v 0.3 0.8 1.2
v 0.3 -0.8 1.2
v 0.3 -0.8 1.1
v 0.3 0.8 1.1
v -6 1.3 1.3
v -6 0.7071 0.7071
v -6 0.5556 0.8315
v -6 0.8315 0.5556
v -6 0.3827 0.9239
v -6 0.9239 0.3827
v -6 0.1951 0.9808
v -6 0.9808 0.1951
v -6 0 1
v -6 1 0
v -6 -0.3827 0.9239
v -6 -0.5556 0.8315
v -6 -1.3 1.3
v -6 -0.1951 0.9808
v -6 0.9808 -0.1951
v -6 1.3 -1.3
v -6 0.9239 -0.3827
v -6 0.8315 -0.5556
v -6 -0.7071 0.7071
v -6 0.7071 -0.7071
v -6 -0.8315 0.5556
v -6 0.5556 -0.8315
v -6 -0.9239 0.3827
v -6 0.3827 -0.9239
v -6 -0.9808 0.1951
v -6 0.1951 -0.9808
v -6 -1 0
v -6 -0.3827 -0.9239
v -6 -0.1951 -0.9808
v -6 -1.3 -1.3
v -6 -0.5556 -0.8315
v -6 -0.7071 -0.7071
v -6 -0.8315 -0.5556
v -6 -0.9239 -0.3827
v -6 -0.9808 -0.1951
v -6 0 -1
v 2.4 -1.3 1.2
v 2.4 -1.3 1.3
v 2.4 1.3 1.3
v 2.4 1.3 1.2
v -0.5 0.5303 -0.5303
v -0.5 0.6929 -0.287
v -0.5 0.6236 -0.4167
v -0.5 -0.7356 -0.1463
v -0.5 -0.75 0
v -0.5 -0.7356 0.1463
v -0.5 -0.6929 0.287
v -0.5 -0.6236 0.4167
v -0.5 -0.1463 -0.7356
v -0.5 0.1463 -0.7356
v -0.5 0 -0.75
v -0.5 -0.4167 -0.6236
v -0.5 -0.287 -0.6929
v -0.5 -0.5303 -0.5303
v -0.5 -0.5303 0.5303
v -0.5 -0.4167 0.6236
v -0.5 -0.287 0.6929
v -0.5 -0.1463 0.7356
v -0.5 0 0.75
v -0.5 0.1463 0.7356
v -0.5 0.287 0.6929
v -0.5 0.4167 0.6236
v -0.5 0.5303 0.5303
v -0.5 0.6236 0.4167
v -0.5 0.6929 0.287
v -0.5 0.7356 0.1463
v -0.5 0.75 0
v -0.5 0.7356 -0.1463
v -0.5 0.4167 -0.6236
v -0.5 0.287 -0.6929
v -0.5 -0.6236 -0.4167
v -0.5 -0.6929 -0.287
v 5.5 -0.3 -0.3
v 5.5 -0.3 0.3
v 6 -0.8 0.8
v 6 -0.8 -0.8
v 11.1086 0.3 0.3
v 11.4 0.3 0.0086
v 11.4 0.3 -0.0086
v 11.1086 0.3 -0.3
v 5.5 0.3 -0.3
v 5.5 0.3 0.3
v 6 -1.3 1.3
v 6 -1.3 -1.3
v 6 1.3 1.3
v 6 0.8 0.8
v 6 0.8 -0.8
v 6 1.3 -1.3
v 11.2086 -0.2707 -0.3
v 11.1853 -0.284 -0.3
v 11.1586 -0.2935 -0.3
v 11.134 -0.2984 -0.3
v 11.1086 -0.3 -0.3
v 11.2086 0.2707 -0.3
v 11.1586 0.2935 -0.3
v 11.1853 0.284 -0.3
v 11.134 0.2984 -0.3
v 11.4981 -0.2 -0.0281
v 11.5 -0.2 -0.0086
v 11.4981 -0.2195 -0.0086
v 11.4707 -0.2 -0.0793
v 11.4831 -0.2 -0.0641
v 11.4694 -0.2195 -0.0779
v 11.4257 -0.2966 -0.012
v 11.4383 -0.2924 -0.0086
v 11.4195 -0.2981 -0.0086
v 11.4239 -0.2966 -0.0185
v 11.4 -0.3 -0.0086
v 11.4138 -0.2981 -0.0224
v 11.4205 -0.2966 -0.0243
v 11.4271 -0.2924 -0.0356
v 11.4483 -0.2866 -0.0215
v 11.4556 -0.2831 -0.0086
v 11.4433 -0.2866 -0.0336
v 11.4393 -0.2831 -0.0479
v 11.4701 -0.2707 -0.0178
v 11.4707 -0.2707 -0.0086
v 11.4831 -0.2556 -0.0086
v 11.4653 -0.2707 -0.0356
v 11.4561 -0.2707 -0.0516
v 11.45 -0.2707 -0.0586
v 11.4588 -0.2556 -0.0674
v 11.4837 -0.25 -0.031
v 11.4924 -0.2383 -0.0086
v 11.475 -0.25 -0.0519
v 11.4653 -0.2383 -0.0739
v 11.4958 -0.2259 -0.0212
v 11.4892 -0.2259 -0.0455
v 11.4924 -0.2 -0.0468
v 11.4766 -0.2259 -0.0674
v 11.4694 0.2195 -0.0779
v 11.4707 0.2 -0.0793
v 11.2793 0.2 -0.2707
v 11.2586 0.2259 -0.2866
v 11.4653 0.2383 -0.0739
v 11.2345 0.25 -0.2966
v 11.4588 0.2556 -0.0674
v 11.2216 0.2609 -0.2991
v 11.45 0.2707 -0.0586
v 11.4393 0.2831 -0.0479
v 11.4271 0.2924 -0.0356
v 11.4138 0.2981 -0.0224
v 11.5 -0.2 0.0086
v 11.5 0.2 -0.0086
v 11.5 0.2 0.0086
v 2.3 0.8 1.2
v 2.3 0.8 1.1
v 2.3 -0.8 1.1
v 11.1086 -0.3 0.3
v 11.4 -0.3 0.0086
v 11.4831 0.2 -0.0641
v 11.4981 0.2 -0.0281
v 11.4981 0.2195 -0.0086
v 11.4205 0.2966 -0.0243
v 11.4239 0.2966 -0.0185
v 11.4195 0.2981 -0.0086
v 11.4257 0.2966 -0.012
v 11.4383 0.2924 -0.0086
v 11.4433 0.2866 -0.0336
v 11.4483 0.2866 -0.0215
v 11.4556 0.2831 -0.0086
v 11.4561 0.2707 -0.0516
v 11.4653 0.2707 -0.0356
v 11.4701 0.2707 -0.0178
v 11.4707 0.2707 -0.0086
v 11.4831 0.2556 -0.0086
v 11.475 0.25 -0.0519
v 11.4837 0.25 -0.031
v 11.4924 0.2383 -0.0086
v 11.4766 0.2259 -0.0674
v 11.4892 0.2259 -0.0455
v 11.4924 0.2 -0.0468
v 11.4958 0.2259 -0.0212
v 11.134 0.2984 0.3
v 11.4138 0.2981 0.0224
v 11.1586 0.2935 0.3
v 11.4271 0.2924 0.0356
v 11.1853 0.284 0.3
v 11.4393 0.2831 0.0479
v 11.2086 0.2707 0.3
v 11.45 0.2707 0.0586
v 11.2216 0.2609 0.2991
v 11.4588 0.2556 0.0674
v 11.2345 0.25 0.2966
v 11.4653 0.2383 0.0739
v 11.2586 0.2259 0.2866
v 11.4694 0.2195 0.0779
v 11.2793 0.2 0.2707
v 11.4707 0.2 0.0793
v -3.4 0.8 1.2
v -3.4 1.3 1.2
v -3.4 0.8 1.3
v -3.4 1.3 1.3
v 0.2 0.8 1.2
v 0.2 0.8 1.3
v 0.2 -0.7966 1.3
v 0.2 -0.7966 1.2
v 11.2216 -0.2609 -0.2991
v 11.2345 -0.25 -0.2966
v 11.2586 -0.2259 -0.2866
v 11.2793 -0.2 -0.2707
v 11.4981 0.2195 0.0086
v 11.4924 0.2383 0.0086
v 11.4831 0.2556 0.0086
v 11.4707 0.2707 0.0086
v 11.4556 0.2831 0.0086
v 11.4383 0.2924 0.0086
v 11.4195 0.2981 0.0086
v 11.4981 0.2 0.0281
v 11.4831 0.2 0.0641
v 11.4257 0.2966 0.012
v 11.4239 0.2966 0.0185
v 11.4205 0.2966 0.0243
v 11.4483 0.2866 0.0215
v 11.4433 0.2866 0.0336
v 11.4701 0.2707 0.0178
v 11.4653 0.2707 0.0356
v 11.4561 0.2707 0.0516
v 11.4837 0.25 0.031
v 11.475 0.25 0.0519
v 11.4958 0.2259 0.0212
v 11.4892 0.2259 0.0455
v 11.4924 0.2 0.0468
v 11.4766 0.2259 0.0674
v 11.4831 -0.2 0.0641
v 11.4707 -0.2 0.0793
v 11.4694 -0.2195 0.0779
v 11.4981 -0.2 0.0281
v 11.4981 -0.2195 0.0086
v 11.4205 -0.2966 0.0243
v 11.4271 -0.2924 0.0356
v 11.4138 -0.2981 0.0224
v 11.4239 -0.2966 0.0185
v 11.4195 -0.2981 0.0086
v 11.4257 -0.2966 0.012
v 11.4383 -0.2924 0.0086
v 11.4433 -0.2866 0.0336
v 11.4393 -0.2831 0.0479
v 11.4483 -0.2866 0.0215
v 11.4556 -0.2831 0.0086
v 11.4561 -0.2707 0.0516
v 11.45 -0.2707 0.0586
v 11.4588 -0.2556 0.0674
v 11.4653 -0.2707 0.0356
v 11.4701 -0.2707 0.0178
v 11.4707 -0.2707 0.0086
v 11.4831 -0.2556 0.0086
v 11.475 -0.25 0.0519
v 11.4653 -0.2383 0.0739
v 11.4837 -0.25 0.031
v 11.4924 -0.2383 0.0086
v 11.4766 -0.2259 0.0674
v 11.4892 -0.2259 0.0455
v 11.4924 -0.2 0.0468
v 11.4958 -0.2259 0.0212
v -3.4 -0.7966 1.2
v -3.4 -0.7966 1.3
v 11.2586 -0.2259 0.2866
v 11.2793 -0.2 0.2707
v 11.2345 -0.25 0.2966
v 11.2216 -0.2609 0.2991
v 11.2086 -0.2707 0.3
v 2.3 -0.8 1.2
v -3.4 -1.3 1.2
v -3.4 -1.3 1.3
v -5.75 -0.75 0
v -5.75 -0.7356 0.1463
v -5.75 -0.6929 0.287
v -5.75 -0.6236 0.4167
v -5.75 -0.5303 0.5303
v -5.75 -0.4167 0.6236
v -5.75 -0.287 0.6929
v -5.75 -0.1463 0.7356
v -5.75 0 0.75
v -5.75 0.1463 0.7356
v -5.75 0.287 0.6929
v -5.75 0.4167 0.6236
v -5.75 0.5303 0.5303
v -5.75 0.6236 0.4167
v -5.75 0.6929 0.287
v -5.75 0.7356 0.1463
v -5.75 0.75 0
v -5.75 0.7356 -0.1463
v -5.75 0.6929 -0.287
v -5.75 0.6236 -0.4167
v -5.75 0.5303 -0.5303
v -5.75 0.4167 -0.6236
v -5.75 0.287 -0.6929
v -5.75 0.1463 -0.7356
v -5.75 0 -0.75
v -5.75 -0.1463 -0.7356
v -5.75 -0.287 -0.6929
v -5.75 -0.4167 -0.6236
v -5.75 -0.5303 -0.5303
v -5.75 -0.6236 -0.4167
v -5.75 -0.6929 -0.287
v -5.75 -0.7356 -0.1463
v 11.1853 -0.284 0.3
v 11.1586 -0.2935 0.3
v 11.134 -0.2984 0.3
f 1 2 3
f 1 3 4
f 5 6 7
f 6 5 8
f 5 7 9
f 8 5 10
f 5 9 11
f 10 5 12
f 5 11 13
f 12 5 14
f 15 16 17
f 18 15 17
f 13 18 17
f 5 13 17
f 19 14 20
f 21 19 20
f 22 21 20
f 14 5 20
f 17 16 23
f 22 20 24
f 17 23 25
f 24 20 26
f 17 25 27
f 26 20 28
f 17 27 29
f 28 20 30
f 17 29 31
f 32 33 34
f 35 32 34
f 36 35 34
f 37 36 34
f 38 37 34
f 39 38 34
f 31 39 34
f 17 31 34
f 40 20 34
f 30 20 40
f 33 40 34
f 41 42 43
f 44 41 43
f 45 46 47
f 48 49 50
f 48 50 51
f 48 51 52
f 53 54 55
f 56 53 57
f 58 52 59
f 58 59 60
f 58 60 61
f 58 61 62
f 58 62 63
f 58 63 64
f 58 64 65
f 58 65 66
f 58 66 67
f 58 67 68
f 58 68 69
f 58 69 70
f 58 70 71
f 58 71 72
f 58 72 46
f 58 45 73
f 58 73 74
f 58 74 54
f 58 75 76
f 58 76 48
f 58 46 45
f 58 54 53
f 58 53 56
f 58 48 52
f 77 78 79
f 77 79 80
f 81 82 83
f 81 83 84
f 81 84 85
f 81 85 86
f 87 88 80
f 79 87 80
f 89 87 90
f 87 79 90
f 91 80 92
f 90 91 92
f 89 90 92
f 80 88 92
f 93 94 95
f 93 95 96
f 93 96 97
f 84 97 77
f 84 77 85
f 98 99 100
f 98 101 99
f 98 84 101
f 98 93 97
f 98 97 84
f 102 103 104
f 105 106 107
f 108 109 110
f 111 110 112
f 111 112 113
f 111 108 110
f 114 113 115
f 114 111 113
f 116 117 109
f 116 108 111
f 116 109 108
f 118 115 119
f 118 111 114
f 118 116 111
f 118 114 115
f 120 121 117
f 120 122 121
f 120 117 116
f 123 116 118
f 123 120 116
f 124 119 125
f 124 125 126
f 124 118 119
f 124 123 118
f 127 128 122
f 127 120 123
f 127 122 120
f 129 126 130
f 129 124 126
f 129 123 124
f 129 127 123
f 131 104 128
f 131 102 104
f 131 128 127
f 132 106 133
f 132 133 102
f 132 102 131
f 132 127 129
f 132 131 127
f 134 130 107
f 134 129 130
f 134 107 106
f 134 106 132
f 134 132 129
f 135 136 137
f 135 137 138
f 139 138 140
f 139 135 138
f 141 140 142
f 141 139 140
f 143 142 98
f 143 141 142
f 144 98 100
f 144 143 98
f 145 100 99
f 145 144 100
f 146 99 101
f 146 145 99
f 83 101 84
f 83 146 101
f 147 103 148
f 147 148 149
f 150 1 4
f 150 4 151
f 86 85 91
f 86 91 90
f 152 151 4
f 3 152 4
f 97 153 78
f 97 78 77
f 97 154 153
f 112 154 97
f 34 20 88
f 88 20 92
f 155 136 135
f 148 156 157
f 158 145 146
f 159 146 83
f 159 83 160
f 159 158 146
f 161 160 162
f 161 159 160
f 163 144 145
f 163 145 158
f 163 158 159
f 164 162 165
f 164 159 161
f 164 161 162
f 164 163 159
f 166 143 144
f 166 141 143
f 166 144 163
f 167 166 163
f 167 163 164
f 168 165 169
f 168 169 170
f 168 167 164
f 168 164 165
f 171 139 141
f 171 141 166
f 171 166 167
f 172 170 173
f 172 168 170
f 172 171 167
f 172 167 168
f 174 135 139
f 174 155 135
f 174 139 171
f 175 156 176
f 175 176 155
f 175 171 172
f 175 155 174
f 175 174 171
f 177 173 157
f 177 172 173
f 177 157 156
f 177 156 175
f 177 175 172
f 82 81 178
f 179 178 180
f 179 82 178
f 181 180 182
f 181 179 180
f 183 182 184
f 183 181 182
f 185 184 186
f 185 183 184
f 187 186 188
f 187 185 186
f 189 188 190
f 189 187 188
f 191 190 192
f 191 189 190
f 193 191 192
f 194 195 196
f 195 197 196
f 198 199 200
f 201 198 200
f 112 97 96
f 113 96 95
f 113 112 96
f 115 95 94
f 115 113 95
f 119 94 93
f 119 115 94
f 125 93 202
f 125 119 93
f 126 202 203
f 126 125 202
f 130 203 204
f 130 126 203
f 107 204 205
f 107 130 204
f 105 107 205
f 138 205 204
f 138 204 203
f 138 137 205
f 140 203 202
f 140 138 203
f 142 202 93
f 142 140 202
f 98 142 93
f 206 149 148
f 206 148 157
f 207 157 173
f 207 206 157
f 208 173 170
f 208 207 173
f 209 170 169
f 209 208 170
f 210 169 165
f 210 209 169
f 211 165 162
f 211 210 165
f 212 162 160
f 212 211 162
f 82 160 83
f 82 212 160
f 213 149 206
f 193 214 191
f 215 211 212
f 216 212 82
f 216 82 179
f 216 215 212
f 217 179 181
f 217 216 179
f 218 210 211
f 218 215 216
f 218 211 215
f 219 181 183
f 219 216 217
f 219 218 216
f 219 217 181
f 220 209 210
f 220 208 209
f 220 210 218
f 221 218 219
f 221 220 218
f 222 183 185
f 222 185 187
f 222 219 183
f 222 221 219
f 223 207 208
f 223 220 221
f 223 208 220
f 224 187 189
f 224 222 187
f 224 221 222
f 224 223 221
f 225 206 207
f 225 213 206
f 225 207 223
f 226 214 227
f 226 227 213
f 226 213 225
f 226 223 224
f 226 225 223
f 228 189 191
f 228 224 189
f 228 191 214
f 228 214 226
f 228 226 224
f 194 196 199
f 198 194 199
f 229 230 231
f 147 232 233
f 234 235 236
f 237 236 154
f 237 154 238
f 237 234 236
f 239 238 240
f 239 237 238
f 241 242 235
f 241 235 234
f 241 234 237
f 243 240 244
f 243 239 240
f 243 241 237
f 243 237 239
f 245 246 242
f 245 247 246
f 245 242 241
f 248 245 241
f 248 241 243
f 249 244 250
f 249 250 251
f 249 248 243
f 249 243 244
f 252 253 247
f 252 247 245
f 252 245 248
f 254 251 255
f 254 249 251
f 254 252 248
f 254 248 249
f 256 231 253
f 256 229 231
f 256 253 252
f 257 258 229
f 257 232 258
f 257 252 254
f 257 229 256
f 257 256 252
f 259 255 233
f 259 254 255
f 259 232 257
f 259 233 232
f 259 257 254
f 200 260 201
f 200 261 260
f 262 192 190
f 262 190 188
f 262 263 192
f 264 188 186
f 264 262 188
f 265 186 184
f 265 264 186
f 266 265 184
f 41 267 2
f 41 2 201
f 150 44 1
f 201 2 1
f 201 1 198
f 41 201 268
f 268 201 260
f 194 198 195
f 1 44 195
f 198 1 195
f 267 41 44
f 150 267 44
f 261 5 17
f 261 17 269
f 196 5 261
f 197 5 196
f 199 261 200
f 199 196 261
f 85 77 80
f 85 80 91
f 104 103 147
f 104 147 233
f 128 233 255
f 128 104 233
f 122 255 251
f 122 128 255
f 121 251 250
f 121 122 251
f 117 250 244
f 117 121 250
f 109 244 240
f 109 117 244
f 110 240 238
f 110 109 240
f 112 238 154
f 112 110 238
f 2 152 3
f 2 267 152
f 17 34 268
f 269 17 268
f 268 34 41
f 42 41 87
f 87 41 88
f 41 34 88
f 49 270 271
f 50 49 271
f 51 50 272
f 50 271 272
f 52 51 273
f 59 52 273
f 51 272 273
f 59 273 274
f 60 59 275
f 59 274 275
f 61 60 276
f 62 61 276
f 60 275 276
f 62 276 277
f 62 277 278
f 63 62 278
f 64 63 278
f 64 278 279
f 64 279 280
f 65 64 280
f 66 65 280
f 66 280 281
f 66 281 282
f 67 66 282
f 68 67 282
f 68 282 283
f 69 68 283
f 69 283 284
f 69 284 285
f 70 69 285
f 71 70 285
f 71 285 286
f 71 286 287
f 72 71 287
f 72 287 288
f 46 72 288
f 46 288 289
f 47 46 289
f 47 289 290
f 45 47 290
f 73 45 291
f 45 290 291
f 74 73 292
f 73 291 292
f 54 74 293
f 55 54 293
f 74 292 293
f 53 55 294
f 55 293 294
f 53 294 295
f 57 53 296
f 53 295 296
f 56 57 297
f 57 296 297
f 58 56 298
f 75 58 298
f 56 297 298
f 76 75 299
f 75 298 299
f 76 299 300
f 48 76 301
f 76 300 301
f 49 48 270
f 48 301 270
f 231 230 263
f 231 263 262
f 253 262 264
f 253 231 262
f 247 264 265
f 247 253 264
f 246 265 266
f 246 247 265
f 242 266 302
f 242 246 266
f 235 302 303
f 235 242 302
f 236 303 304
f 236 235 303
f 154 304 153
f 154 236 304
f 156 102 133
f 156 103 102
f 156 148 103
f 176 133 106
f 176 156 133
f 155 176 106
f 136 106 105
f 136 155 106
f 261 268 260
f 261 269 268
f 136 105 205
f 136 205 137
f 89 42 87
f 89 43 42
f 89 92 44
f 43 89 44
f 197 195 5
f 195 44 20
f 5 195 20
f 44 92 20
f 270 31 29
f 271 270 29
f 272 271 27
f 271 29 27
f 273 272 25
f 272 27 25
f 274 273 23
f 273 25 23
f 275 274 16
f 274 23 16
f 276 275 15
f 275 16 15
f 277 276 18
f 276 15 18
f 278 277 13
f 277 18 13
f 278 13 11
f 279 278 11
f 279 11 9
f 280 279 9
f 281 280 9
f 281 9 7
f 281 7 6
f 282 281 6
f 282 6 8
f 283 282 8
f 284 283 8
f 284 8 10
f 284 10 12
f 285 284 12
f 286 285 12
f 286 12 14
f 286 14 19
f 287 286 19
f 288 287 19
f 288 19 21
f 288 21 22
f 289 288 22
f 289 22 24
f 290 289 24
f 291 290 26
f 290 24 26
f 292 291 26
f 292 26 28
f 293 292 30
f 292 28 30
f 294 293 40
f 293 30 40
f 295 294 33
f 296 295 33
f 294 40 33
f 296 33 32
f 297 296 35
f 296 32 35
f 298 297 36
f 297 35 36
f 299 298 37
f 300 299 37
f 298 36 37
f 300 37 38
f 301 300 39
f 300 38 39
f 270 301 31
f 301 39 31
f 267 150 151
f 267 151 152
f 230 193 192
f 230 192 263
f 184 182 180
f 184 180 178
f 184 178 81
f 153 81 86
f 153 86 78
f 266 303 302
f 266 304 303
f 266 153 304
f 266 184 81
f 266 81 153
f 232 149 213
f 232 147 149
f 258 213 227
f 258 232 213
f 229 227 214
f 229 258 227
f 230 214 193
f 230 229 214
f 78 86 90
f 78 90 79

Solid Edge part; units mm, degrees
sketch "Sketch1" plane through (0, 0, 0) normal (0, 0, 1) x (1, 0, 0)
  line L0 (-6, -1.3) -> (6, -1.3)
  line L1 (6, -1.3) -> (6, 1.3)
  line L2 (6, 1.3) -> (-6, 1.3)
  line L3 (-6, 1.3) -> (-6, -1.3)
  dimension "D1" = 2.6
  dimension "D2" = 12
extrude "Protrusion1" add sketch "Sketch1" along normal mid plane 2.6
sketch "Sketch2" plane through (6, 0, 0) normal (1, 0, 0) x (0, 1, 0)
  line L0 (-0.3, -0.3) -> (0.3, -0.3)
  line L1 (0.3, -0.3) -> (0.3, 0.3)
  line L2 (0.3, 0.3) -> (-0.3, 0.3)
  line L3 (-0.3, 0.3) -> (-0.3, -0.3)
  dimension "D1" = 0.6
  dimension "D2" = 0.6
extrude "Extrusionsausschnitt_1" cut sketch "Sketch2" against normal blind 5.5
chamfer "Fase_1" distance 0.5 angle 45 4 edges at (6, 0, 0.3) (6, 0.3, 0) (6, -0.3, 0) (6, 0, -0.3)
sketch "Sketch3" plane through (-6, 0, 0) normal (-1, 0, 0) x (0, -1, 0)
  circle A0 centre (0, 0) radius 0.75
  dimension "D1" = 1.5
extrude "Extrusionsausschnitt_2" cut sketch "Sketch3" against normal blind 5.5
sketch "Sketch4" plane through (0, 0, 1.3) normal (0, 0, 1) x (1, 0, 0)
  line L0 (0.2, -1.3) -> (-3.4, -1.3)
  line L1 (-3.4, -1.3) -> (-3.4, -0.7966)
  line L2 (-3.4, -0.7966) -> (0.2, -0.7966)
  line L3 (0.2, 0.8) -> (0.2, -0.7966)
  line L4 (-3.4, 0.8) -> (0.2, 0.8)
  line L5 (-3.4, 1.3) -> (-3.4, 0.8)
  line L6 (0.2, 1.3) -> (-3.4, 1.3)
  line L7 (2.4, 1.3) -> (0.2, 1.3)
  line L8 (2.4, -1.3) -> (2.4, 1.3)
  line L9 (0.2, -1.3) -> (2.4, -1.3)
  dimension "D1" = 3.6
  dimension "D2" = 2.2
  dimension "D3" = 0.5
  dimension "D4" = 0.5034
  dimension "D5" = 3.6
extrude "Extrusionsausschnitt_3" cut sketch "Sketch4" against normal blind 0.1
sketch "Sketch5" plane through (-0.5, 0, 1.2) normal (0, 0, 1) x (1, 0, 0)
  line L0 (0.8, 0.8) -> (2.8, 0.8)
  line L1 (2.8, 0.8) -> (2.8, -0.8)
  line L2 (2.8, -0.8) -> (0.8, -0.8)
  line L3 (0.8, -0.8) -> (0.8, 0.8)
  dimension "D1" = 0.1
  dimension "D2" = 0.1
  dimension "D3" = 1.6
  dimension "D4" = 0.5
extrude "Extrusionsausschnitt_4" cut sketch "Sketch5" against normal blind 0.1
sketch "Sketch6" plane through (6, 0, 0) normal (1, 0, 0) x (0, 0, -1)
  line L0 (-0.3, -0.3) -> (0.3, -0.3)
  line L1 (0.3, -0.3) -> (0.3, 0.3)
  line L2 (0.3, 0.3) -> (-0.3, 0.3)
  line L3 (-0.3, 0.3) -> (-0.3, -0.3)
extrude "Extrusionsausprägung_2" add sketch "Sketch6" against normal blind 5.5 and the other way blind 5.5
chamfer "Fase_2" distance 0.25 angle 45 2 edges at (11.5, 0, 0.3) (11.5, 0, -0.3)
fillet "Verrundung_1" radius 0.1 10 edges at (11.5, 0, 0.05) (11.5, 0, -0.05) (11.25, 0, 0.3) (11.25, 0, -0.3) (11.375, -0.3, -0.175) (11.375, -0.3, 0.175) (11.5, -0.3, 0) (11.375, 0.3, 0.175) (11.5, 0.3, 0) (11.375, 0.3, -0.175)
chamfer "Fase_3" distance 0.25 angle 45 1 edges at (-6, 0.75, 0)
